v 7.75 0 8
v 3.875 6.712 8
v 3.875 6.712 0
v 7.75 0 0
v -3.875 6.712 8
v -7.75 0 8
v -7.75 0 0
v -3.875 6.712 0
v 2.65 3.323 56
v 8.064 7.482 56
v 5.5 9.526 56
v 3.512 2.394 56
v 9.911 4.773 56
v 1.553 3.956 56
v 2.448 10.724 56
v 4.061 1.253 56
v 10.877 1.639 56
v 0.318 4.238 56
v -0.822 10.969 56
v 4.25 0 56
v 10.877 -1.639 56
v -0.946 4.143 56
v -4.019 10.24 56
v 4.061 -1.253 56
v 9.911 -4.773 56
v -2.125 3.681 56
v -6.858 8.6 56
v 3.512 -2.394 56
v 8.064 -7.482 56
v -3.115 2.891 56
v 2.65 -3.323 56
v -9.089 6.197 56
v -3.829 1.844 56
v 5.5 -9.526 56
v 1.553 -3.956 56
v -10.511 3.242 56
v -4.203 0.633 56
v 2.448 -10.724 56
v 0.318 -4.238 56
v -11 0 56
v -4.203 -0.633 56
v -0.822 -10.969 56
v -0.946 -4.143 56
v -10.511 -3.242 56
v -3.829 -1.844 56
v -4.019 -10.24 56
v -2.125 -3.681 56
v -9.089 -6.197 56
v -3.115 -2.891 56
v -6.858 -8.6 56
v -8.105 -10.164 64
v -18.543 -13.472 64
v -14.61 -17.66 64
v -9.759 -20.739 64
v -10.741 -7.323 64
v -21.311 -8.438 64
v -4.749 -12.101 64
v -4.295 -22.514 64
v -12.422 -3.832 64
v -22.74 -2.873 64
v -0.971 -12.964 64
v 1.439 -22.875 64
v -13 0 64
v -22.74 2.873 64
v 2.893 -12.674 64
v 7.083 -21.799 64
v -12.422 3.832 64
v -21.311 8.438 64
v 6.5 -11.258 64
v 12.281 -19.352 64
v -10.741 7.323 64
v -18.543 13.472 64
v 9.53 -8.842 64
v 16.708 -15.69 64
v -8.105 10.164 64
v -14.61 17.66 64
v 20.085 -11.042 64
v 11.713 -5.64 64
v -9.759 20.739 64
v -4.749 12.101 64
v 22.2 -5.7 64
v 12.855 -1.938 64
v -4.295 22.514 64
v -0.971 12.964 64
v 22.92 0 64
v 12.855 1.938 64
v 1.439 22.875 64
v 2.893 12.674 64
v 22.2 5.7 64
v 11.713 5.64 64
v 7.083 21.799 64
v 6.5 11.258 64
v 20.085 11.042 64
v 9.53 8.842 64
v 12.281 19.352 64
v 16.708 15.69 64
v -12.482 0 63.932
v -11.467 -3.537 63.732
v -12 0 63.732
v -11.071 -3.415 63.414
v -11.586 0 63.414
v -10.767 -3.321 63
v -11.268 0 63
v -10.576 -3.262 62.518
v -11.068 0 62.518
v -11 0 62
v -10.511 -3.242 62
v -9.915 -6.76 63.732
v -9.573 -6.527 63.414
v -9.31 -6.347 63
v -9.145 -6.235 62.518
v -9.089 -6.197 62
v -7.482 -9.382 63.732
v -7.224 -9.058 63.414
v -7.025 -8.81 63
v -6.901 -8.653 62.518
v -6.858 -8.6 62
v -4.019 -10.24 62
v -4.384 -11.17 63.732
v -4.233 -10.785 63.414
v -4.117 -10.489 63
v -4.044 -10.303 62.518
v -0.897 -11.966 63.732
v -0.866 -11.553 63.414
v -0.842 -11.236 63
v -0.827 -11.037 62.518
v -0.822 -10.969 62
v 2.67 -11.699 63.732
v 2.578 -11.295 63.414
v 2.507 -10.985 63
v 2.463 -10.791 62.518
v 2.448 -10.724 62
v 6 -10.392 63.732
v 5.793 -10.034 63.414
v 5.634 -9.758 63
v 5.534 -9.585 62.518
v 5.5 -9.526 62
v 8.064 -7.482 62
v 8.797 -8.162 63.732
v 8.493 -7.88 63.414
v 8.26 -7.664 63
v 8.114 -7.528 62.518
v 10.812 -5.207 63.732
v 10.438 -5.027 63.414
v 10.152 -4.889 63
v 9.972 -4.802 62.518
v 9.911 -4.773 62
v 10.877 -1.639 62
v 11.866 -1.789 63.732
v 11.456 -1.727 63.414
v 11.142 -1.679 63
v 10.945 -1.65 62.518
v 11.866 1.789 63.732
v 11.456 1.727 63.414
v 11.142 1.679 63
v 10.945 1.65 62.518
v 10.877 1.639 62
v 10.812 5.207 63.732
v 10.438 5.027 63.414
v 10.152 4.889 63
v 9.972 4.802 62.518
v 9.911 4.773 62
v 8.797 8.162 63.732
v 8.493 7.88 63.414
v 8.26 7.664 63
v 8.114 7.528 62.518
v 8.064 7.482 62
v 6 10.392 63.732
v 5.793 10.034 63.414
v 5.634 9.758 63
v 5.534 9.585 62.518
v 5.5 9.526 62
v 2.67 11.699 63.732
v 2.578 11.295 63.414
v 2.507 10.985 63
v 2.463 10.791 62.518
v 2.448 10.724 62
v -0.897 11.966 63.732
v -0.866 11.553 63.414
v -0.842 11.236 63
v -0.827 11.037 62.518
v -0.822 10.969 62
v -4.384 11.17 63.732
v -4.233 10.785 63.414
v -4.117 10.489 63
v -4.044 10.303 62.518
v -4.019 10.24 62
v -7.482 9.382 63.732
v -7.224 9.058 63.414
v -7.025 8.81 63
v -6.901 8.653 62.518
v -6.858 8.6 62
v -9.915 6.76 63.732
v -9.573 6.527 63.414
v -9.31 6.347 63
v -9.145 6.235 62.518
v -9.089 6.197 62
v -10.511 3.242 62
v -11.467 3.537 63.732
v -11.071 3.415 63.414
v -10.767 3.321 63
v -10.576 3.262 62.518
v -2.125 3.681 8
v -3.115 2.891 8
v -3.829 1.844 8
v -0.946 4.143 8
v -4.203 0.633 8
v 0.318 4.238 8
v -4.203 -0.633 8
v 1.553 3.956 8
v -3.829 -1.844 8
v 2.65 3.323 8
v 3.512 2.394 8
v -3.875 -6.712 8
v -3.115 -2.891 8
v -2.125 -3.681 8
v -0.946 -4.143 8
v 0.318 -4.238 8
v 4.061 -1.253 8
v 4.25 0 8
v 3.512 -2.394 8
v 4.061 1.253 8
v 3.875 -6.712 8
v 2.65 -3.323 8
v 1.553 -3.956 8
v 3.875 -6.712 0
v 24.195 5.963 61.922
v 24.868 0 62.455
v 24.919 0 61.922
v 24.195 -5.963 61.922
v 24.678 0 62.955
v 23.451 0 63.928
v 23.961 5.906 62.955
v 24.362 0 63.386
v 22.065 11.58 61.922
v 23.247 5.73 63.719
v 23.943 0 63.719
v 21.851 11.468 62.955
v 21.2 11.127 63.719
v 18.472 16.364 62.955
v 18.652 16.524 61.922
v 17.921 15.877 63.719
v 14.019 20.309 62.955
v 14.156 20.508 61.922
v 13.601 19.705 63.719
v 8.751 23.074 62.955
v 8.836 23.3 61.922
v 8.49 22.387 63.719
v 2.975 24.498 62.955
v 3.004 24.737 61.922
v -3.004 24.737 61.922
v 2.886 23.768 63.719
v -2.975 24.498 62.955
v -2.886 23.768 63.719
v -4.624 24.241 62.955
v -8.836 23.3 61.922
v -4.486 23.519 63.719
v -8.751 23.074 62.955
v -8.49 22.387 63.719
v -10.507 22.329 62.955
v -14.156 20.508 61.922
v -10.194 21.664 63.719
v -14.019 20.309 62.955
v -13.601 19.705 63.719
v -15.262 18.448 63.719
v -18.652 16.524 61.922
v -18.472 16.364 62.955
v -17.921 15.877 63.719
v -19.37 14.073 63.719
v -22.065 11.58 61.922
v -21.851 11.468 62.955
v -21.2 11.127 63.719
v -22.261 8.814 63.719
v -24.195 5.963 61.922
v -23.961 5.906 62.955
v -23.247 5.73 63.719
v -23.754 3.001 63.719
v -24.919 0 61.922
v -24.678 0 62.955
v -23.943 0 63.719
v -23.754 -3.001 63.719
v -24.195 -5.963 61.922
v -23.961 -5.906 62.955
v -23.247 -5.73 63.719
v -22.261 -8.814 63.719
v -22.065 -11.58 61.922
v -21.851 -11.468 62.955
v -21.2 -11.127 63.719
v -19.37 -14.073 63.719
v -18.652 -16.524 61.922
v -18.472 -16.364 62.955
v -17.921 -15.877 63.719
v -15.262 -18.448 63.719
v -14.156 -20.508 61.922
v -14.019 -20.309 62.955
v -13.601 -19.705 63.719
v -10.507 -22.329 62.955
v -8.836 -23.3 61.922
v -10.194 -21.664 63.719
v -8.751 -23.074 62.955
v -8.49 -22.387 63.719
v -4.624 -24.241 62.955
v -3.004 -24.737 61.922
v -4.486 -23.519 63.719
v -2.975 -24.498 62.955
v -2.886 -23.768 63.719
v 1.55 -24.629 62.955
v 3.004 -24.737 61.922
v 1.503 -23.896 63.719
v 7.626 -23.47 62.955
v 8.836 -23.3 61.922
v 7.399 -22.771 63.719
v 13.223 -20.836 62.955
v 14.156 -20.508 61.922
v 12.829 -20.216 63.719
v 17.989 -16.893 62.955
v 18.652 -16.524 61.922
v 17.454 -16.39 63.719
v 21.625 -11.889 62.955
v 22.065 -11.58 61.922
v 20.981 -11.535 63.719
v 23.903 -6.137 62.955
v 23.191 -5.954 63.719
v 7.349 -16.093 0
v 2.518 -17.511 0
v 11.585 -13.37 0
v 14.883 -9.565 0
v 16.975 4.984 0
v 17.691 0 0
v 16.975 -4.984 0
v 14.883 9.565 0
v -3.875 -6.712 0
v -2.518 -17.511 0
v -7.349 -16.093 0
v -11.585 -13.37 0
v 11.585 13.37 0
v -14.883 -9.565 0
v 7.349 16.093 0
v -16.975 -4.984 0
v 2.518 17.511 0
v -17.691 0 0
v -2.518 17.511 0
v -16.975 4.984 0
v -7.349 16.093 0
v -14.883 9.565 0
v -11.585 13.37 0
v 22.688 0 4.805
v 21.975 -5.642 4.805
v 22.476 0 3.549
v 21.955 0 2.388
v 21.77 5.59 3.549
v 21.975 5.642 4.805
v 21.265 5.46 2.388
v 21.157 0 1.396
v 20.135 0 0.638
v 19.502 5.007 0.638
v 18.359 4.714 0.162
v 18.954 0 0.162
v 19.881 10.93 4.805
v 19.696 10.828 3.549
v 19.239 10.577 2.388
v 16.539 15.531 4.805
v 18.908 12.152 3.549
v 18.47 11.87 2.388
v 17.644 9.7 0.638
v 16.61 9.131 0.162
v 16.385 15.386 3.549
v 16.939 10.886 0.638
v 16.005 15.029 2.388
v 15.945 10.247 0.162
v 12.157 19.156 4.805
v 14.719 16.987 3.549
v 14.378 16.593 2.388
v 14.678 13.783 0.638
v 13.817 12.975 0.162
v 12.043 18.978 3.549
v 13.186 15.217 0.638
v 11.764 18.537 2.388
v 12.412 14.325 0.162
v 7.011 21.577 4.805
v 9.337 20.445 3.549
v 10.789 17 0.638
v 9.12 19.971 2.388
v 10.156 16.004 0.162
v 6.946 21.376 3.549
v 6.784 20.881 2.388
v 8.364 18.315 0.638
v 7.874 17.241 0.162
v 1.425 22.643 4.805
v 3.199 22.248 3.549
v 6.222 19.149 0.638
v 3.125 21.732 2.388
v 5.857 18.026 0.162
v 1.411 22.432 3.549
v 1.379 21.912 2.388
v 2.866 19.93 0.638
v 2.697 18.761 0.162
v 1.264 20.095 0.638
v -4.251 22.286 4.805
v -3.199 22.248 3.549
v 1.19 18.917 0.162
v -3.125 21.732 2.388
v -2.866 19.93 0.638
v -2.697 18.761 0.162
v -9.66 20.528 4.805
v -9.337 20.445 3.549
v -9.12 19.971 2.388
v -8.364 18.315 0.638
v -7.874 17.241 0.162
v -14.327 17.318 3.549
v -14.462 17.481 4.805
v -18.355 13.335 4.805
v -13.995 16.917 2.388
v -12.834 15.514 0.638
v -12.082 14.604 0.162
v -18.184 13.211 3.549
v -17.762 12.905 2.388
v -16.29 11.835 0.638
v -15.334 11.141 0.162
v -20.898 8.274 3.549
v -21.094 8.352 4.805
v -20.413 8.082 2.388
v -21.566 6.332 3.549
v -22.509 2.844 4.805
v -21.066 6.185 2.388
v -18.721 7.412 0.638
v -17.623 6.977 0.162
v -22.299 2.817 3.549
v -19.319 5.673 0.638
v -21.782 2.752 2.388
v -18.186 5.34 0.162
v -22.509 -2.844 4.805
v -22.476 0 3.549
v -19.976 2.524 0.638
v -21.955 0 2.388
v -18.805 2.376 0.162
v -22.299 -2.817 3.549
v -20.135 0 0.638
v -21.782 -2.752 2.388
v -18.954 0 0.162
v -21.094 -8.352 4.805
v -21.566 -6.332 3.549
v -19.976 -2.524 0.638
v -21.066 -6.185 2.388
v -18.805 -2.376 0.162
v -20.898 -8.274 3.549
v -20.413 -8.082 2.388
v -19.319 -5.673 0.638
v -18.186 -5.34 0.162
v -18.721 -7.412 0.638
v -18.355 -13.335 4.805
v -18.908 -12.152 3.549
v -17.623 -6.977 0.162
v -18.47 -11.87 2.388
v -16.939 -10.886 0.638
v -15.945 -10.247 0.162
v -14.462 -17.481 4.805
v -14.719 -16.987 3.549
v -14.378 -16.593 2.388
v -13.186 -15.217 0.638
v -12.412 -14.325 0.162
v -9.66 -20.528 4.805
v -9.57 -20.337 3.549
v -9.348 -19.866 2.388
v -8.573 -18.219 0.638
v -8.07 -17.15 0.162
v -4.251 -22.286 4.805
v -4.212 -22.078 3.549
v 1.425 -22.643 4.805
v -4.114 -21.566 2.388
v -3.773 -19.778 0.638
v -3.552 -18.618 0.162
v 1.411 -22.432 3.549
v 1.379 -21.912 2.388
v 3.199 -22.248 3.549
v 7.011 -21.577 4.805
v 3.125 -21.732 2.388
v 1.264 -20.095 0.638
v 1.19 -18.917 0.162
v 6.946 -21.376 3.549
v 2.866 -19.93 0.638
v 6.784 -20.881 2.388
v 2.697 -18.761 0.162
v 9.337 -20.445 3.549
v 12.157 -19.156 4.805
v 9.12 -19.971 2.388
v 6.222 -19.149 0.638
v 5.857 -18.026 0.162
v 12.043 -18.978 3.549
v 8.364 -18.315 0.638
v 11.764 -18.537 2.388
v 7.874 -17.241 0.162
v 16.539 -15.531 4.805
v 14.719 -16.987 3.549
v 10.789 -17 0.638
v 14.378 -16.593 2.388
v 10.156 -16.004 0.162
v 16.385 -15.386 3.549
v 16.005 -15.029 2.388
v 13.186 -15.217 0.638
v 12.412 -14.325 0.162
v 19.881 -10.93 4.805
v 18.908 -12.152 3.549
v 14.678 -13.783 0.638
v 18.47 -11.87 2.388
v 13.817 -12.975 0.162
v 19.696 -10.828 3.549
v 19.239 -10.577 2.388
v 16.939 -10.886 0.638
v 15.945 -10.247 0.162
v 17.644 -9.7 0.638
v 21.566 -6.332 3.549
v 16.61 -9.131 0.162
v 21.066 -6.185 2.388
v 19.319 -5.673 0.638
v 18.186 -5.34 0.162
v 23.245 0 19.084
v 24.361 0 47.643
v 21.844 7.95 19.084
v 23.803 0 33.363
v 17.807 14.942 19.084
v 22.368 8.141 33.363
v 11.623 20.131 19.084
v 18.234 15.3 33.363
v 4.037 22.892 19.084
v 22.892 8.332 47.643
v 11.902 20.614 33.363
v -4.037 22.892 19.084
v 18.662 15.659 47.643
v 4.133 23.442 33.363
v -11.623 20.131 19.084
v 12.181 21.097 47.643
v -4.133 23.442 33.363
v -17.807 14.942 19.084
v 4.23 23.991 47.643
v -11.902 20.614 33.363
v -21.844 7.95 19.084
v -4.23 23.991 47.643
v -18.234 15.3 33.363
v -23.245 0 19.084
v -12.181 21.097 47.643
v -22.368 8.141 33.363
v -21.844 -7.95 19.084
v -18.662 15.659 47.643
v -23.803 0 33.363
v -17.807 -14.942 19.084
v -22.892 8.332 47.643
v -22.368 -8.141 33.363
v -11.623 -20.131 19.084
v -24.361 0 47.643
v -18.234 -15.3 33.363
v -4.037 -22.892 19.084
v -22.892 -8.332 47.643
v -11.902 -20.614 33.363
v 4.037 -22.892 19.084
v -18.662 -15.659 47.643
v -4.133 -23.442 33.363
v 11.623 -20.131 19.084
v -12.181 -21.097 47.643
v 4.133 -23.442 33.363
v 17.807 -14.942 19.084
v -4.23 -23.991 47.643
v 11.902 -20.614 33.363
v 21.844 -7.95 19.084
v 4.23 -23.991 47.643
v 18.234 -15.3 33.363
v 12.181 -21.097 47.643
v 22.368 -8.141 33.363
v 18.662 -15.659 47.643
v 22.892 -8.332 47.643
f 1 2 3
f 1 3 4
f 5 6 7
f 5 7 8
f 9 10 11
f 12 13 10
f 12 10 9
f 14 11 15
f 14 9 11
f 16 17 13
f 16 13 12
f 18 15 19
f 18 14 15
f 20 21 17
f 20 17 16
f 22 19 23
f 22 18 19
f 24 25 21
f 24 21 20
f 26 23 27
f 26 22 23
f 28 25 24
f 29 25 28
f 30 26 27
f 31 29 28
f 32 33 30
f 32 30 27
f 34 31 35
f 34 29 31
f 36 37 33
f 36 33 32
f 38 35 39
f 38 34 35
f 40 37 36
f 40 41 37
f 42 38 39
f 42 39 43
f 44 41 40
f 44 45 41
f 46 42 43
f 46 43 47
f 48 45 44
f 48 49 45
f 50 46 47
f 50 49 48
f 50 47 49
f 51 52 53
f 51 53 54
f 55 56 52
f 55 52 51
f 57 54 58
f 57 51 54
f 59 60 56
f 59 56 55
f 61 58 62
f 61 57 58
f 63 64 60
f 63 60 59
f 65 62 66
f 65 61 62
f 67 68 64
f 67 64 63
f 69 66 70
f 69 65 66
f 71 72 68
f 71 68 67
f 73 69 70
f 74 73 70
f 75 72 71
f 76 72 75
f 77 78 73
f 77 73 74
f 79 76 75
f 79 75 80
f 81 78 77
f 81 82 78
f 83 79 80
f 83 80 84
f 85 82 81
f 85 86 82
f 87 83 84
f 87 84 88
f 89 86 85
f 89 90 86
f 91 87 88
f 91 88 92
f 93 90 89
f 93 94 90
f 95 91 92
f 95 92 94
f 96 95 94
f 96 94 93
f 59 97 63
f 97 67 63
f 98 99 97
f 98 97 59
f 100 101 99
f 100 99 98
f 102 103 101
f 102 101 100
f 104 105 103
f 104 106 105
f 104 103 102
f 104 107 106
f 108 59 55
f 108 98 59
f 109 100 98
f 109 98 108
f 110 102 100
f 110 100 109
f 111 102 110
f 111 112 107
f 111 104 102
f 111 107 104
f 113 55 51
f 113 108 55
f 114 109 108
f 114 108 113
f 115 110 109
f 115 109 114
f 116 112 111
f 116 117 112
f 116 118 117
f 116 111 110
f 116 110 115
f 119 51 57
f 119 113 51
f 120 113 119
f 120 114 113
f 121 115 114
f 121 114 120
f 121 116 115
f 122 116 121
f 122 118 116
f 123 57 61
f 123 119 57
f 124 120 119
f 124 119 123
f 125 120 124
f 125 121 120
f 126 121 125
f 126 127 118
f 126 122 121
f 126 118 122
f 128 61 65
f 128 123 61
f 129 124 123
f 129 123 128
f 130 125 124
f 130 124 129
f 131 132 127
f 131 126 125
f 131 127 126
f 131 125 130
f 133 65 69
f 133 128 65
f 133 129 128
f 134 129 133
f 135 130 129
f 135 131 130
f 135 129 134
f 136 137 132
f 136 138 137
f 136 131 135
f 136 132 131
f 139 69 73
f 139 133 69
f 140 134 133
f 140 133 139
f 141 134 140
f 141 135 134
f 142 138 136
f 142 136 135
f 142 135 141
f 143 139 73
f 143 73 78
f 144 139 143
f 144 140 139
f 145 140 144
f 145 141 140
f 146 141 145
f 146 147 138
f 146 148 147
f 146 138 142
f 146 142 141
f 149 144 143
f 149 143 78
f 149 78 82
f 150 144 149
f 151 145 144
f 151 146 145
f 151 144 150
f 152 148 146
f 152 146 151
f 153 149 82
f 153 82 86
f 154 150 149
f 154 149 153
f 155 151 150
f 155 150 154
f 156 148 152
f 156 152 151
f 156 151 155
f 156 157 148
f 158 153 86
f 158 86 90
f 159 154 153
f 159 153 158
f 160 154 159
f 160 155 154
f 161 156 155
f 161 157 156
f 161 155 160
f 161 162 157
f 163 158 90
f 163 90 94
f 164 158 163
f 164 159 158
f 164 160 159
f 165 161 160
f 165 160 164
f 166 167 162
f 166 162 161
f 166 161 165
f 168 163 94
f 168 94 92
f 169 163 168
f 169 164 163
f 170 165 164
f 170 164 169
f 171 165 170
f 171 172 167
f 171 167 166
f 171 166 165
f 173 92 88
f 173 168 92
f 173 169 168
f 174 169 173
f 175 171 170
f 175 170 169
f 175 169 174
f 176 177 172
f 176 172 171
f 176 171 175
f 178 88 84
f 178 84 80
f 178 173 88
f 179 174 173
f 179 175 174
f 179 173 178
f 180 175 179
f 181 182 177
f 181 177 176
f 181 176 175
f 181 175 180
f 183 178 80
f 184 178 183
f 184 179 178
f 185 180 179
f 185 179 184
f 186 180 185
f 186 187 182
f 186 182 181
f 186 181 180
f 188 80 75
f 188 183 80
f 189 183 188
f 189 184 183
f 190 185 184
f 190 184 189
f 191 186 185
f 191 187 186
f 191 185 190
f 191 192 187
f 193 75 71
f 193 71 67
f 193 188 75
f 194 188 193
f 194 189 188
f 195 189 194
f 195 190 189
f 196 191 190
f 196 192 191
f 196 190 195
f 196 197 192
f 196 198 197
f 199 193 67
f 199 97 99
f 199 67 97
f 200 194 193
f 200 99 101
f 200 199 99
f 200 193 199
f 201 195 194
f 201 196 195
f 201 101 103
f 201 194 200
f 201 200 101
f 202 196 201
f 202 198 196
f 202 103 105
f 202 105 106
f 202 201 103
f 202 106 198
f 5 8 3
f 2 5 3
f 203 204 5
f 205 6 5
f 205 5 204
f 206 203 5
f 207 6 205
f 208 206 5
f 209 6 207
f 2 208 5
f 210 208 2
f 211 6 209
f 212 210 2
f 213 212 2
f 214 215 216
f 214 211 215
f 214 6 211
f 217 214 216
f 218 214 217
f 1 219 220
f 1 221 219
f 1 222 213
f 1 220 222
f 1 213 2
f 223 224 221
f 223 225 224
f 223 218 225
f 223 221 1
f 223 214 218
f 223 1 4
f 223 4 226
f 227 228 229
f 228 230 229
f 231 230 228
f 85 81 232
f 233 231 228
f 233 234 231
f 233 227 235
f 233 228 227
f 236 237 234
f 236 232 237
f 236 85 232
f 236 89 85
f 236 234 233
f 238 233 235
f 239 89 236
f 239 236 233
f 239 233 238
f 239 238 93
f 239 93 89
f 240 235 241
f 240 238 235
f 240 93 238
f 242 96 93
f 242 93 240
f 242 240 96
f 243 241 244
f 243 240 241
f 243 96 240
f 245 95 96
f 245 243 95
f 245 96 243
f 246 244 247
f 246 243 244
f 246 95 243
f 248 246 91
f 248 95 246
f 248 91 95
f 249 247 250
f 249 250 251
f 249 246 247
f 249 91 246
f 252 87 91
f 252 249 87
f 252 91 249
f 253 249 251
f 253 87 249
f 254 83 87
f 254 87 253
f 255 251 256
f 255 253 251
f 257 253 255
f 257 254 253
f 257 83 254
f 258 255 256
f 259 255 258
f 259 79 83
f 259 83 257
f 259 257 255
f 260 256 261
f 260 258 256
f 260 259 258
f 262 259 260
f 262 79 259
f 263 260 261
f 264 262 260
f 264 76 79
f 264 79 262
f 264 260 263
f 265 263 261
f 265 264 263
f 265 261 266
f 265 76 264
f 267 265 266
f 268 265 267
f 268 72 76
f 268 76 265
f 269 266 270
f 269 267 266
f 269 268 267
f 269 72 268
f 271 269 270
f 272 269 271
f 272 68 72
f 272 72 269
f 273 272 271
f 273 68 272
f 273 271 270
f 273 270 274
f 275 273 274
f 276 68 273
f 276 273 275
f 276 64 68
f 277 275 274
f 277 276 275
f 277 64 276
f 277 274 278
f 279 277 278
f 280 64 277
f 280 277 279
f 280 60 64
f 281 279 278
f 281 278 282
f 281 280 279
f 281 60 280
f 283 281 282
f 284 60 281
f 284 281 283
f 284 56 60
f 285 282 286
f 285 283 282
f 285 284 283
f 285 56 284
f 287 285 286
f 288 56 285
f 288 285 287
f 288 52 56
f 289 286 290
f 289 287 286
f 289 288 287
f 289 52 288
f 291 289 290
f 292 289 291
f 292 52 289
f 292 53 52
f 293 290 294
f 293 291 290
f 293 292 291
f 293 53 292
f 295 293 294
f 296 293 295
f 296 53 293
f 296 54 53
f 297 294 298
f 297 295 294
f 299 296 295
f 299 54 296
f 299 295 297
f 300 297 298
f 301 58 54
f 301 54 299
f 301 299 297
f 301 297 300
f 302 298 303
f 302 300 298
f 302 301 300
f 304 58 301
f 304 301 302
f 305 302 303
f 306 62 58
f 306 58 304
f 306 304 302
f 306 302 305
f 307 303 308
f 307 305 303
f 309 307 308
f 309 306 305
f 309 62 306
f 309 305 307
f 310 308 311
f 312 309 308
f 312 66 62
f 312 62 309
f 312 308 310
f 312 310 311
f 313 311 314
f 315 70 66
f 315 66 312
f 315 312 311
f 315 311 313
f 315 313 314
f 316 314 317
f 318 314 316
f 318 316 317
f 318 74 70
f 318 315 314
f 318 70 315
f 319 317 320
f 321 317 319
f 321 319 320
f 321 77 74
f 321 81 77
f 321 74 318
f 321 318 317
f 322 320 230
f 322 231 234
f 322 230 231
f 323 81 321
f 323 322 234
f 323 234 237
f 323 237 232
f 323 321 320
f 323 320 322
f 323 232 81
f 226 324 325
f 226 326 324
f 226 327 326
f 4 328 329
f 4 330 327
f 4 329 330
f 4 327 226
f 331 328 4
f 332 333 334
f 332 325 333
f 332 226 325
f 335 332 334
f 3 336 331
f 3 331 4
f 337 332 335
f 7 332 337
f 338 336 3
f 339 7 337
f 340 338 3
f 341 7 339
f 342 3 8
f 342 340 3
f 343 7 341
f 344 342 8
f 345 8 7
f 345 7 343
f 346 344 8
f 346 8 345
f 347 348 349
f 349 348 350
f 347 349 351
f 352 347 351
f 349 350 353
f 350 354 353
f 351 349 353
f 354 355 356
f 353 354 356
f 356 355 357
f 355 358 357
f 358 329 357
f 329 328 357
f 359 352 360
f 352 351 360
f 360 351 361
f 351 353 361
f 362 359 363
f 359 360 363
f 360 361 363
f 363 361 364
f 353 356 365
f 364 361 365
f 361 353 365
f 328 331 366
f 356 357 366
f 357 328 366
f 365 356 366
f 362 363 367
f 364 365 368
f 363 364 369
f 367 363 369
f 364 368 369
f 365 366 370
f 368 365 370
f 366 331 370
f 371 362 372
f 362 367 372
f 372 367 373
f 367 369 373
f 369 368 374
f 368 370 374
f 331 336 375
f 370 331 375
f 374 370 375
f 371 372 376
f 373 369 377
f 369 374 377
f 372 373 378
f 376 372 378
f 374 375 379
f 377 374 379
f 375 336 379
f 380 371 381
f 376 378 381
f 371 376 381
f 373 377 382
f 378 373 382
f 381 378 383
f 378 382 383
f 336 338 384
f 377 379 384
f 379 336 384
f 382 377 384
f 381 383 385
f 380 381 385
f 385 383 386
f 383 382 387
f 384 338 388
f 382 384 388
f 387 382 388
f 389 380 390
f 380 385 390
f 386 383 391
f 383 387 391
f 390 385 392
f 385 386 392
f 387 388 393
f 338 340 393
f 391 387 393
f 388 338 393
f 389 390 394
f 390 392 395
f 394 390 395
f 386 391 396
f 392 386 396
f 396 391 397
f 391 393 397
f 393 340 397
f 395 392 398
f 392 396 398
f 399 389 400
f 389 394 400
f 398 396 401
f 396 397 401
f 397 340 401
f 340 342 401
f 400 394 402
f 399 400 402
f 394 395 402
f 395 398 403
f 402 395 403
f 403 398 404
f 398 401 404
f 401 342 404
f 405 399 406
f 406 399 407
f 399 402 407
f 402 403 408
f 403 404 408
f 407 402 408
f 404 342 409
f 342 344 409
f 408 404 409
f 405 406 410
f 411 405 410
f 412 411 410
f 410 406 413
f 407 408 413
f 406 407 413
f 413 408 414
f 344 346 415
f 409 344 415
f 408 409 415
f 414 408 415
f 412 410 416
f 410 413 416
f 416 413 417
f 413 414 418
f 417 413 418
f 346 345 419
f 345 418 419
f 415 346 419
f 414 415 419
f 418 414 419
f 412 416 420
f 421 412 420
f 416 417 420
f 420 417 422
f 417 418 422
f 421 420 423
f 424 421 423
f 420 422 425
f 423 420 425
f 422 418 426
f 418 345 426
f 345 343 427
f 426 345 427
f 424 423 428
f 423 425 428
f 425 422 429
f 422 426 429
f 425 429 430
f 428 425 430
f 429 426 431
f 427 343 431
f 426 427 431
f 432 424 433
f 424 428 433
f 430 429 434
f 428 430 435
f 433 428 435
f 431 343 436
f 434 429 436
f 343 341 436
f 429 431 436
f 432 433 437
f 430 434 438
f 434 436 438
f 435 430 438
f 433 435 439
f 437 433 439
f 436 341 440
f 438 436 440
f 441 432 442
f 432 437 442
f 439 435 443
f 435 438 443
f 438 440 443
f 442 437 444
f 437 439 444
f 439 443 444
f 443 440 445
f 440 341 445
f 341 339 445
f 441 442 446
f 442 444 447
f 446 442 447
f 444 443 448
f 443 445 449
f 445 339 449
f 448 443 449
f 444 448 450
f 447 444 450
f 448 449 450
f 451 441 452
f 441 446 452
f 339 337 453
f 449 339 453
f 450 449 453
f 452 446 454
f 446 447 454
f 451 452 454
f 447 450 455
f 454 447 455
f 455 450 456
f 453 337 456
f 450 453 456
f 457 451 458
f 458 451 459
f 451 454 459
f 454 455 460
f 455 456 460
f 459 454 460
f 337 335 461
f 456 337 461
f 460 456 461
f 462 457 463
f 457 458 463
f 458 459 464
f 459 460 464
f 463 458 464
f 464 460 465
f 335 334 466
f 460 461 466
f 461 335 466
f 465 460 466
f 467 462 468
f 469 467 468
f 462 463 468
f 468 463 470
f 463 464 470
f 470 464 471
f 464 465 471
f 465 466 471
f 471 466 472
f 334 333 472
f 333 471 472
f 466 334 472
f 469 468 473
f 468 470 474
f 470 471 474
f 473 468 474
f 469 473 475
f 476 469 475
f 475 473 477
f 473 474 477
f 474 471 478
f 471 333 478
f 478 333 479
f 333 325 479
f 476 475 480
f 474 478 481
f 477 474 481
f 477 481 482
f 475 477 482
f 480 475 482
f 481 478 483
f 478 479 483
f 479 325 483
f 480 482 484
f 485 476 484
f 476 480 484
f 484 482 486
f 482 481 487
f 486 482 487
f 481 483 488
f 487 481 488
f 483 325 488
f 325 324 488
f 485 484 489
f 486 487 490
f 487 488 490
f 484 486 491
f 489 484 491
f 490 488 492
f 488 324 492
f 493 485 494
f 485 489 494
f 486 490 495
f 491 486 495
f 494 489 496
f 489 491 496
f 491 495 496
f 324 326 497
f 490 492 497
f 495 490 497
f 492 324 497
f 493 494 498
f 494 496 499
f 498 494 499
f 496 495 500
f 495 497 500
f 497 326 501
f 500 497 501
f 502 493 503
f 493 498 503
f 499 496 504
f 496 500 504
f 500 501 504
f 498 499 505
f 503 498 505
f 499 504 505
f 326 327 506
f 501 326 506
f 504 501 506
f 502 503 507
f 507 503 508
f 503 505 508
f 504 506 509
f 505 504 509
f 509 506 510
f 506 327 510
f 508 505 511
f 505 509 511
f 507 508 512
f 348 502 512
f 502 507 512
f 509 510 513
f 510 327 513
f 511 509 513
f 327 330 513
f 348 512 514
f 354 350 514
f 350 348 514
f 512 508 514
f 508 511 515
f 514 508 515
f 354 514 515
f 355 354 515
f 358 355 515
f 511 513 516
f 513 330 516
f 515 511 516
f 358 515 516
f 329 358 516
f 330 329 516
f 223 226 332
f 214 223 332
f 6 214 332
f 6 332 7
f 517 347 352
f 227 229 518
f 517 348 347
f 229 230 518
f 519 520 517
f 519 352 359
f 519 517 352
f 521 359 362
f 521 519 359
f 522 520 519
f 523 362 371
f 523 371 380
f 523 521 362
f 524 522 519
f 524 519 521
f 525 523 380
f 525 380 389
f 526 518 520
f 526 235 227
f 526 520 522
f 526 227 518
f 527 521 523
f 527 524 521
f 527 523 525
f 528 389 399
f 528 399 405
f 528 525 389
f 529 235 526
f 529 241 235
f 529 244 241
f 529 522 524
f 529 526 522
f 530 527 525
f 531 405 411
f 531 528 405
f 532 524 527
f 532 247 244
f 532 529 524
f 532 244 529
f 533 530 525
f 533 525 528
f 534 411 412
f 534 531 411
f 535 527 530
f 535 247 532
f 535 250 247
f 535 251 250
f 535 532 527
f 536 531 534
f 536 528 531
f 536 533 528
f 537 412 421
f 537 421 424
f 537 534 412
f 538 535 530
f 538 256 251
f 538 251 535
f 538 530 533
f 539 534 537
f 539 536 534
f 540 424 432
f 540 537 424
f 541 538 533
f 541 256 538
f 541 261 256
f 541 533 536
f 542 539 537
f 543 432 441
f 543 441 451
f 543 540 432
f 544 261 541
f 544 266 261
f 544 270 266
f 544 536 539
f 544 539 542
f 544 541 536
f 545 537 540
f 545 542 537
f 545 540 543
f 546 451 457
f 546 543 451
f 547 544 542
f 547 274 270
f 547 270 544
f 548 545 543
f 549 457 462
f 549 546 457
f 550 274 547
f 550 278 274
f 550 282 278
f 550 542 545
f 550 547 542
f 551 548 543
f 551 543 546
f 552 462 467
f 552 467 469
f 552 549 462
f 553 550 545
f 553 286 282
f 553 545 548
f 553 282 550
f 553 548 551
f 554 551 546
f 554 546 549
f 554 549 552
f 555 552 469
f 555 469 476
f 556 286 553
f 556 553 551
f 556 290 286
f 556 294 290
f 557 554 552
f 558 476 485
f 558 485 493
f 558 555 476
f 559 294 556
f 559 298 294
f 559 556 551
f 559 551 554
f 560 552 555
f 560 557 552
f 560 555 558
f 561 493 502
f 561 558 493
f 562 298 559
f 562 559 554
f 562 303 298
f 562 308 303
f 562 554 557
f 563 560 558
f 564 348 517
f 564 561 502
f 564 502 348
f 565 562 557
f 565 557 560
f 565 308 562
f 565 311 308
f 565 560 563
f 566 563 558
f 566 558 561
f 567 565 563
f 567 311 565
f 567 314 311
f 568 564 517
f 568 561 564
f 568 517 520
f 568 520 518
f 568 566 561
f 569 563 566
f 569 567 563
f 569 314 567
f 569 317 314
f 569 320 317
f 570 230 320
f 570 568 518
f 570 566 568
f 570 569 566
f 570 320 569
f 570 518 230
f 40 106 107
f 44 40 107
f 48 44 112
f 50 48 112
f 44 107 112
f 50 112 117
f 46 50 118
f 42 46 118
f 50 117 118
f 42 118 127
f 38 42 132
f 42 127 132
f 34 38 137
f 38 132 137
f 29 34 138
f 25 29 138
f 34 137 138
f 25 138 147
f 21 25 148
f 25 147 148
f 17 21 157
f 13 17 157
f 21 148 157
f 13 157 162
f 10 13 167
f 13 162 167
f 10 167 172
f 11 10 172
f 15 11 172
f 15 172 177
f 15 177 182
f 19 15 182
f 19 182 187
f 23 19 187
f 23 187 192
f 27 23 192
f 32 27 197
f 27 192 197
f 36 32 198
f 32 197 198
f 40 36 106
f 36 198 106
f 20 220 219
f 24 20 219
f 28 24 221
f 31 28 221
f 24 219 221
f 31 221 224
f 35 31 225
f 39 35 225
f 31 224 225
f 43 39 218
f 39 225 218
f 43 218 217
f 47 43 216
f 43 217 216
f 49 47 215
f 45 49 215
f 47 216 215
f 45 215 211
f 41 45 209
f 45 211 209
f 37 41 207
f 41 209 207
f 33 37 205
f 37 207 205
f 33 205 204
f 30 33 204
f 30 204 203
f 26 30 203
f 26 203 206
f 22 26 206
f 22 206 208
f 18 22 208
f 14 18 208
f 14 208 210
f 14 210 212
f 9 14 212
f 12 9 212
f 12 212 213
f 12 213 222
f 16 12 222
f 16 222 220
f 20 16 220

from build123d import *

# Parameters (mm, degrees)
POCKET_DEPTH    = 8
SKETCH003_R     = 4.25
POCKET001_DEPTH = 64.001
SKETCH004_R     = 11
POCKET002_DEPTH = 8
FILLET_R        = 2
FILLET001_R     = 5


with BuildPart() as part:
    # Sketch → Revolution (revolve)
    with BuildSketch(Plane.XZ):
        Polygon((0, 0), (22.5, 0), (25, 64), (0, 64), align=None)
    revolve(axis=Axis((0, 0, 0), (0, 0, 1)))

    # Sketch002 (on Face1 of Revolution) → Pocket (cut)
    with BuildSketch(Plane(origin=(0, 0, 0), x_dir=(1, 0, 0), z_dir=(0, 0, -1))):
        Polygon((7.75, 0), (3.875, 6.711697), (-3.875, 6.711697), (-7.75, 0), (-3.875, -6.711697), (3.875, -6.711697), align=None)
    extrude(amount=-POCKET_DEPTH, mode=Mode.SUBTRACT)

    # Sketch003 (on Face1 of Pocket) → Pocket001 (cut, through all)
    with BuildSketch(Plane(origin=(0, 0, 0), x_dir=(1, 0, 0), z_dir=(0, 0, -1))):
        Circle(SKETCH003_R)
    extrude(amount=-POCKET001_DEPTH, mode=Mode.SUBTRACT)

    # Sketch004 (on Face9 of Pocket001) → Pocket002 (cut)
    with BuildSketch(Plane(origin=(0, 0, 64), x_dir=(-1, 0, 0), z_dir=(0, 0, 1))):
        Circle(SKETCH004_R)
    extrude(amount=-POCKET002_DEPTH, mode=Mode.SUBTRACT)

    # Fillet
    fillet_edges = [part.edges().sort_by_distance(p)[0] for p in [
        (-25, 0, 64),
        (11, 0, 64),
    ]]
    fillet(fillet_edges, radius=FILLET_R)

    # Fillet001
    fillet001_edges = [part.edges().sort_by_distance(p)[0] for p in [
        (-22.5, 0, 0),
    ]]
    fillet(fillet001_edges, radius=FILLET001_R)


solid = part.part
